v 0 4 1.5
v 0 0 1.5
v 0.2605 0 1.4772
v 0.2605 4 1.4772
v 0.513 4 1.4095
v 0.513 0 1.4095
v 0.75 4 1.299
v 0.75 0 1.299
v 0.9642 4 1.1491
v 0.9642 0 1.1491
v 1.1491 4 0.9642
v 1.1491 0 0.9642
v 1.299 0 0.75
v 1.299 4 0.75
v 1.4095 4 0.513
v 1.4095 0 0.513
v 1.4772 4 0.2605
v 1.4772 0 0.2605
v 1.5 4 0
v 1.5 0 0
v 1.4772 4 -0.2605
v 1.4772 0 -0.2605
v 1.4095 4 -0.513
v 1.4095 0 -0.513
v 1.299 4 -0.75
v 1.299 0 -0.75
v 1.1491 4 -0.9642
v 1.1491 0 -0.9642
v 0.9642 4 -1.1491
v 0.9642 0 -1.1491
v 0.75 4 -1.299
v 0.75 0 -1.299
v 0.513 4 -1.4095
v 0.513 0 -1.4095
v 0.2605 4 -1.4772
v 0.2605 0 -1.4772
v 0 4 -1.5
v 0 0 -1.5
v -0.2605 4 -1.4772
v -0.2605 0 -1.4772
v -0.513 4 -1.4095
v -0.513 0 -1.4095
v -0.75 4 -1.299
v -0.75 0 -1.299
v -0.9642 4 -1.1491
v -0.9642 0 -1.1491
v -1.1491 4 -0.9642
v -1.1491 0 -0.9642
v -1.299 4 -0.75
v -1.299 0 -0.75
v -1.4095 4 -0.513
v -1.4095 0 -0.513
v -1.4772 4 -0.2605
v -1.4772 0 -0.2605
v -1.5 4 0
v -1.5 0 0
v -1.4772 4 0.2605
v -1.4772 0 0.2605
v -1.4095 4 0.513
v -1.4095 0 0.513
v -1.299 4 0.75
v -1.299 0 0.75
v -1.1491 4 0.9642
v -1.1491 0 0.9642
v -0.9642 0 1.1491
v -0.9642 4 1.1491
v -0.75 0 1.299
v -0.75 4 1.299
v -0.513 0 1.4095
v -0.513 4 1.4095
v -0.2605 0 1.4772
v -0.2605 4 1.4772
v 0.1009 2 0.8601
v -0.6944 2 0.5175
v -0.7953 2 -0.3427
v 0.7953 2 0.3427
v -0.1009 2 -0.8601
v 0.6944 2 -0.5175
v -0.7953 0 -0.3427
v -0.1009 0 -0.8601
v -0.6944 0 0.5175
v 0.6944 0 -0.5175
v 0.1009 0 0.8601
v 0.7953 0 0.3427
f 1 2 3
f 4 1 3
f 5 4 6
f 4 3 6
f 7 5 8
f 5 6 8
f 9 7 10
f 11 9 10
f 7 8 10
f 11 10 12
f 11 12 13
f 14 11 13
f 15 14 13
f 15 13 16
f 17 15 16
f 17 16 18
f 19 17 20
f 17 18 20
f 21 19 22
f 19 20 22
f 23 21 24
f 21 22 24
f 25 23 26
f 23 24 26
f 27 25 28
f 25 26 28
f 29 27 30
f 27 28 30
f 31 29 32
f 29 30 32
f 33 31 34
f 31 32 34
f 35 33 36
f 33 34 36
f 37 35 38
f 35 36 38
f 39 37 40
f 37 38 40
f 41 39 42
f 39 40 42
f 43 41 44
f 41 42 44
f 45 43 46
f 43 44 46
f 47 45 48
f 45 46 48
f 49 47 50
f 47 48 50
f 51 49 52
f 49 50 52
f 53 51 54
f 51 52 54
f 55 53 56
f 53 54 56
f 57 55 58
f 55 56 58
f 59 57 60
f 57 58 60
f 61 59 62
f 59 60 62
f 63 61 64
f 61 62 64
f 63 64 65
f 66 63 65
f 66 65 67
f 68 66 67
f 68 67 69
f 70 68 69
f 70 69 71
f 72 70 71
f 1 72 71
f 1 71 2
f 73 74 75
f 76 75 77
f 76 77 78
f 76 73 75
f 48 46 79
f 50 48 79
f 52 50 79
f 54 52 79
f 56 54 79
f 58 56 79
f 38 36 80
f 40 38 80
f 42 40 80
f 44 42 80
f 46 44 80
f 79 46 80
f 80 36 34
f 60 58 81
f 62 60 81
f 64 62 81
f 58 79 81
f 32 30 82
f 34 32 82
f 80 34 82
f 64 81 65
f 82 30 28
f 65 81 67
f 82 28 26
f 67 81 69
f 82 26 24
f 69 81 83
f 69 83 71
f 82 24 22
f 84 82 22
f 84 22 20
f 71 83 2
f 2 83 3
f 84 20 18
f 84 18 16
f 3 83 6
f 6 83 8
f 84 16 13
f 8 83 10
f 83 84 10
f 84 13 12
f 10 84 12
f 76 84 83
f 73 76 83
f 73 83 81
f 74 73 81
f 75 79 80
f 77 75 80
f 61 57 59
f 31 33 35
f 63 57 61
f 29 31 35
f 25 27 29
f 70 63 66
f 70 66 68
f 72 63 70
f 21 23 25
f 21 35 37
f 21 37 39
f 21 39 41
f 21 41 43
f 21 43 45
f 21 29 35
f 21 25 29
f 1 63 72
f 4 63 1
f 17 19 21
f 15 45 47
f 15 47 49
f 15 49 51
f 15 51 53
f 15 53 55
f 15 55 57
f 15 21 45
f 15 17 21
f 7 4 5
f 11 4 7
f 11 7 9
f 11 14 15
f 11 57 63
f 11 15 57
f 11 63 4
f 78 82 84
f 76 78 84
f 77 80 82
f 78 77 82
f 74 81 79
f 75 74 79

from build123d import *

# Parameters (mm, degrees)
SKETCH_1_R          = 1.5
EXTRUDE_1_DEPTH     = 4
CUT_EXTRUDE_1_DEPTH = 2


with BuildPart() as part:
    # 草图1 → 凸台-拉伸1 (new body)
    with BuildSketch(Plane(origin=(0, 0, 0), x_dir=(1, 0, 0), z_dir=(0, 1, 0))):
        with Locations(Location((0, 0, 0), (0, 0, 270))):
            Circle(SKETCH_1_R)
    extrude(amount=EXTRUDE_1_DEPTH)

    # 草图2 → 切除-拉伸1 (cut)
    with BuildSketch(Plane.XZ):
        Polygon((0.694435065, -0.517455255), (0.795346928, 0.34267078), (0.100911863, 0.860126035), (-0.694435065, 0.517455255), (-0.795346928, -0.34267078), (-0.100911863, -0.860126035), align=None)
    extrude(amount=-CUT_EXTRUDE_1_DEPTH, mode=Mode.SUBTRACT)


solid = part.part
